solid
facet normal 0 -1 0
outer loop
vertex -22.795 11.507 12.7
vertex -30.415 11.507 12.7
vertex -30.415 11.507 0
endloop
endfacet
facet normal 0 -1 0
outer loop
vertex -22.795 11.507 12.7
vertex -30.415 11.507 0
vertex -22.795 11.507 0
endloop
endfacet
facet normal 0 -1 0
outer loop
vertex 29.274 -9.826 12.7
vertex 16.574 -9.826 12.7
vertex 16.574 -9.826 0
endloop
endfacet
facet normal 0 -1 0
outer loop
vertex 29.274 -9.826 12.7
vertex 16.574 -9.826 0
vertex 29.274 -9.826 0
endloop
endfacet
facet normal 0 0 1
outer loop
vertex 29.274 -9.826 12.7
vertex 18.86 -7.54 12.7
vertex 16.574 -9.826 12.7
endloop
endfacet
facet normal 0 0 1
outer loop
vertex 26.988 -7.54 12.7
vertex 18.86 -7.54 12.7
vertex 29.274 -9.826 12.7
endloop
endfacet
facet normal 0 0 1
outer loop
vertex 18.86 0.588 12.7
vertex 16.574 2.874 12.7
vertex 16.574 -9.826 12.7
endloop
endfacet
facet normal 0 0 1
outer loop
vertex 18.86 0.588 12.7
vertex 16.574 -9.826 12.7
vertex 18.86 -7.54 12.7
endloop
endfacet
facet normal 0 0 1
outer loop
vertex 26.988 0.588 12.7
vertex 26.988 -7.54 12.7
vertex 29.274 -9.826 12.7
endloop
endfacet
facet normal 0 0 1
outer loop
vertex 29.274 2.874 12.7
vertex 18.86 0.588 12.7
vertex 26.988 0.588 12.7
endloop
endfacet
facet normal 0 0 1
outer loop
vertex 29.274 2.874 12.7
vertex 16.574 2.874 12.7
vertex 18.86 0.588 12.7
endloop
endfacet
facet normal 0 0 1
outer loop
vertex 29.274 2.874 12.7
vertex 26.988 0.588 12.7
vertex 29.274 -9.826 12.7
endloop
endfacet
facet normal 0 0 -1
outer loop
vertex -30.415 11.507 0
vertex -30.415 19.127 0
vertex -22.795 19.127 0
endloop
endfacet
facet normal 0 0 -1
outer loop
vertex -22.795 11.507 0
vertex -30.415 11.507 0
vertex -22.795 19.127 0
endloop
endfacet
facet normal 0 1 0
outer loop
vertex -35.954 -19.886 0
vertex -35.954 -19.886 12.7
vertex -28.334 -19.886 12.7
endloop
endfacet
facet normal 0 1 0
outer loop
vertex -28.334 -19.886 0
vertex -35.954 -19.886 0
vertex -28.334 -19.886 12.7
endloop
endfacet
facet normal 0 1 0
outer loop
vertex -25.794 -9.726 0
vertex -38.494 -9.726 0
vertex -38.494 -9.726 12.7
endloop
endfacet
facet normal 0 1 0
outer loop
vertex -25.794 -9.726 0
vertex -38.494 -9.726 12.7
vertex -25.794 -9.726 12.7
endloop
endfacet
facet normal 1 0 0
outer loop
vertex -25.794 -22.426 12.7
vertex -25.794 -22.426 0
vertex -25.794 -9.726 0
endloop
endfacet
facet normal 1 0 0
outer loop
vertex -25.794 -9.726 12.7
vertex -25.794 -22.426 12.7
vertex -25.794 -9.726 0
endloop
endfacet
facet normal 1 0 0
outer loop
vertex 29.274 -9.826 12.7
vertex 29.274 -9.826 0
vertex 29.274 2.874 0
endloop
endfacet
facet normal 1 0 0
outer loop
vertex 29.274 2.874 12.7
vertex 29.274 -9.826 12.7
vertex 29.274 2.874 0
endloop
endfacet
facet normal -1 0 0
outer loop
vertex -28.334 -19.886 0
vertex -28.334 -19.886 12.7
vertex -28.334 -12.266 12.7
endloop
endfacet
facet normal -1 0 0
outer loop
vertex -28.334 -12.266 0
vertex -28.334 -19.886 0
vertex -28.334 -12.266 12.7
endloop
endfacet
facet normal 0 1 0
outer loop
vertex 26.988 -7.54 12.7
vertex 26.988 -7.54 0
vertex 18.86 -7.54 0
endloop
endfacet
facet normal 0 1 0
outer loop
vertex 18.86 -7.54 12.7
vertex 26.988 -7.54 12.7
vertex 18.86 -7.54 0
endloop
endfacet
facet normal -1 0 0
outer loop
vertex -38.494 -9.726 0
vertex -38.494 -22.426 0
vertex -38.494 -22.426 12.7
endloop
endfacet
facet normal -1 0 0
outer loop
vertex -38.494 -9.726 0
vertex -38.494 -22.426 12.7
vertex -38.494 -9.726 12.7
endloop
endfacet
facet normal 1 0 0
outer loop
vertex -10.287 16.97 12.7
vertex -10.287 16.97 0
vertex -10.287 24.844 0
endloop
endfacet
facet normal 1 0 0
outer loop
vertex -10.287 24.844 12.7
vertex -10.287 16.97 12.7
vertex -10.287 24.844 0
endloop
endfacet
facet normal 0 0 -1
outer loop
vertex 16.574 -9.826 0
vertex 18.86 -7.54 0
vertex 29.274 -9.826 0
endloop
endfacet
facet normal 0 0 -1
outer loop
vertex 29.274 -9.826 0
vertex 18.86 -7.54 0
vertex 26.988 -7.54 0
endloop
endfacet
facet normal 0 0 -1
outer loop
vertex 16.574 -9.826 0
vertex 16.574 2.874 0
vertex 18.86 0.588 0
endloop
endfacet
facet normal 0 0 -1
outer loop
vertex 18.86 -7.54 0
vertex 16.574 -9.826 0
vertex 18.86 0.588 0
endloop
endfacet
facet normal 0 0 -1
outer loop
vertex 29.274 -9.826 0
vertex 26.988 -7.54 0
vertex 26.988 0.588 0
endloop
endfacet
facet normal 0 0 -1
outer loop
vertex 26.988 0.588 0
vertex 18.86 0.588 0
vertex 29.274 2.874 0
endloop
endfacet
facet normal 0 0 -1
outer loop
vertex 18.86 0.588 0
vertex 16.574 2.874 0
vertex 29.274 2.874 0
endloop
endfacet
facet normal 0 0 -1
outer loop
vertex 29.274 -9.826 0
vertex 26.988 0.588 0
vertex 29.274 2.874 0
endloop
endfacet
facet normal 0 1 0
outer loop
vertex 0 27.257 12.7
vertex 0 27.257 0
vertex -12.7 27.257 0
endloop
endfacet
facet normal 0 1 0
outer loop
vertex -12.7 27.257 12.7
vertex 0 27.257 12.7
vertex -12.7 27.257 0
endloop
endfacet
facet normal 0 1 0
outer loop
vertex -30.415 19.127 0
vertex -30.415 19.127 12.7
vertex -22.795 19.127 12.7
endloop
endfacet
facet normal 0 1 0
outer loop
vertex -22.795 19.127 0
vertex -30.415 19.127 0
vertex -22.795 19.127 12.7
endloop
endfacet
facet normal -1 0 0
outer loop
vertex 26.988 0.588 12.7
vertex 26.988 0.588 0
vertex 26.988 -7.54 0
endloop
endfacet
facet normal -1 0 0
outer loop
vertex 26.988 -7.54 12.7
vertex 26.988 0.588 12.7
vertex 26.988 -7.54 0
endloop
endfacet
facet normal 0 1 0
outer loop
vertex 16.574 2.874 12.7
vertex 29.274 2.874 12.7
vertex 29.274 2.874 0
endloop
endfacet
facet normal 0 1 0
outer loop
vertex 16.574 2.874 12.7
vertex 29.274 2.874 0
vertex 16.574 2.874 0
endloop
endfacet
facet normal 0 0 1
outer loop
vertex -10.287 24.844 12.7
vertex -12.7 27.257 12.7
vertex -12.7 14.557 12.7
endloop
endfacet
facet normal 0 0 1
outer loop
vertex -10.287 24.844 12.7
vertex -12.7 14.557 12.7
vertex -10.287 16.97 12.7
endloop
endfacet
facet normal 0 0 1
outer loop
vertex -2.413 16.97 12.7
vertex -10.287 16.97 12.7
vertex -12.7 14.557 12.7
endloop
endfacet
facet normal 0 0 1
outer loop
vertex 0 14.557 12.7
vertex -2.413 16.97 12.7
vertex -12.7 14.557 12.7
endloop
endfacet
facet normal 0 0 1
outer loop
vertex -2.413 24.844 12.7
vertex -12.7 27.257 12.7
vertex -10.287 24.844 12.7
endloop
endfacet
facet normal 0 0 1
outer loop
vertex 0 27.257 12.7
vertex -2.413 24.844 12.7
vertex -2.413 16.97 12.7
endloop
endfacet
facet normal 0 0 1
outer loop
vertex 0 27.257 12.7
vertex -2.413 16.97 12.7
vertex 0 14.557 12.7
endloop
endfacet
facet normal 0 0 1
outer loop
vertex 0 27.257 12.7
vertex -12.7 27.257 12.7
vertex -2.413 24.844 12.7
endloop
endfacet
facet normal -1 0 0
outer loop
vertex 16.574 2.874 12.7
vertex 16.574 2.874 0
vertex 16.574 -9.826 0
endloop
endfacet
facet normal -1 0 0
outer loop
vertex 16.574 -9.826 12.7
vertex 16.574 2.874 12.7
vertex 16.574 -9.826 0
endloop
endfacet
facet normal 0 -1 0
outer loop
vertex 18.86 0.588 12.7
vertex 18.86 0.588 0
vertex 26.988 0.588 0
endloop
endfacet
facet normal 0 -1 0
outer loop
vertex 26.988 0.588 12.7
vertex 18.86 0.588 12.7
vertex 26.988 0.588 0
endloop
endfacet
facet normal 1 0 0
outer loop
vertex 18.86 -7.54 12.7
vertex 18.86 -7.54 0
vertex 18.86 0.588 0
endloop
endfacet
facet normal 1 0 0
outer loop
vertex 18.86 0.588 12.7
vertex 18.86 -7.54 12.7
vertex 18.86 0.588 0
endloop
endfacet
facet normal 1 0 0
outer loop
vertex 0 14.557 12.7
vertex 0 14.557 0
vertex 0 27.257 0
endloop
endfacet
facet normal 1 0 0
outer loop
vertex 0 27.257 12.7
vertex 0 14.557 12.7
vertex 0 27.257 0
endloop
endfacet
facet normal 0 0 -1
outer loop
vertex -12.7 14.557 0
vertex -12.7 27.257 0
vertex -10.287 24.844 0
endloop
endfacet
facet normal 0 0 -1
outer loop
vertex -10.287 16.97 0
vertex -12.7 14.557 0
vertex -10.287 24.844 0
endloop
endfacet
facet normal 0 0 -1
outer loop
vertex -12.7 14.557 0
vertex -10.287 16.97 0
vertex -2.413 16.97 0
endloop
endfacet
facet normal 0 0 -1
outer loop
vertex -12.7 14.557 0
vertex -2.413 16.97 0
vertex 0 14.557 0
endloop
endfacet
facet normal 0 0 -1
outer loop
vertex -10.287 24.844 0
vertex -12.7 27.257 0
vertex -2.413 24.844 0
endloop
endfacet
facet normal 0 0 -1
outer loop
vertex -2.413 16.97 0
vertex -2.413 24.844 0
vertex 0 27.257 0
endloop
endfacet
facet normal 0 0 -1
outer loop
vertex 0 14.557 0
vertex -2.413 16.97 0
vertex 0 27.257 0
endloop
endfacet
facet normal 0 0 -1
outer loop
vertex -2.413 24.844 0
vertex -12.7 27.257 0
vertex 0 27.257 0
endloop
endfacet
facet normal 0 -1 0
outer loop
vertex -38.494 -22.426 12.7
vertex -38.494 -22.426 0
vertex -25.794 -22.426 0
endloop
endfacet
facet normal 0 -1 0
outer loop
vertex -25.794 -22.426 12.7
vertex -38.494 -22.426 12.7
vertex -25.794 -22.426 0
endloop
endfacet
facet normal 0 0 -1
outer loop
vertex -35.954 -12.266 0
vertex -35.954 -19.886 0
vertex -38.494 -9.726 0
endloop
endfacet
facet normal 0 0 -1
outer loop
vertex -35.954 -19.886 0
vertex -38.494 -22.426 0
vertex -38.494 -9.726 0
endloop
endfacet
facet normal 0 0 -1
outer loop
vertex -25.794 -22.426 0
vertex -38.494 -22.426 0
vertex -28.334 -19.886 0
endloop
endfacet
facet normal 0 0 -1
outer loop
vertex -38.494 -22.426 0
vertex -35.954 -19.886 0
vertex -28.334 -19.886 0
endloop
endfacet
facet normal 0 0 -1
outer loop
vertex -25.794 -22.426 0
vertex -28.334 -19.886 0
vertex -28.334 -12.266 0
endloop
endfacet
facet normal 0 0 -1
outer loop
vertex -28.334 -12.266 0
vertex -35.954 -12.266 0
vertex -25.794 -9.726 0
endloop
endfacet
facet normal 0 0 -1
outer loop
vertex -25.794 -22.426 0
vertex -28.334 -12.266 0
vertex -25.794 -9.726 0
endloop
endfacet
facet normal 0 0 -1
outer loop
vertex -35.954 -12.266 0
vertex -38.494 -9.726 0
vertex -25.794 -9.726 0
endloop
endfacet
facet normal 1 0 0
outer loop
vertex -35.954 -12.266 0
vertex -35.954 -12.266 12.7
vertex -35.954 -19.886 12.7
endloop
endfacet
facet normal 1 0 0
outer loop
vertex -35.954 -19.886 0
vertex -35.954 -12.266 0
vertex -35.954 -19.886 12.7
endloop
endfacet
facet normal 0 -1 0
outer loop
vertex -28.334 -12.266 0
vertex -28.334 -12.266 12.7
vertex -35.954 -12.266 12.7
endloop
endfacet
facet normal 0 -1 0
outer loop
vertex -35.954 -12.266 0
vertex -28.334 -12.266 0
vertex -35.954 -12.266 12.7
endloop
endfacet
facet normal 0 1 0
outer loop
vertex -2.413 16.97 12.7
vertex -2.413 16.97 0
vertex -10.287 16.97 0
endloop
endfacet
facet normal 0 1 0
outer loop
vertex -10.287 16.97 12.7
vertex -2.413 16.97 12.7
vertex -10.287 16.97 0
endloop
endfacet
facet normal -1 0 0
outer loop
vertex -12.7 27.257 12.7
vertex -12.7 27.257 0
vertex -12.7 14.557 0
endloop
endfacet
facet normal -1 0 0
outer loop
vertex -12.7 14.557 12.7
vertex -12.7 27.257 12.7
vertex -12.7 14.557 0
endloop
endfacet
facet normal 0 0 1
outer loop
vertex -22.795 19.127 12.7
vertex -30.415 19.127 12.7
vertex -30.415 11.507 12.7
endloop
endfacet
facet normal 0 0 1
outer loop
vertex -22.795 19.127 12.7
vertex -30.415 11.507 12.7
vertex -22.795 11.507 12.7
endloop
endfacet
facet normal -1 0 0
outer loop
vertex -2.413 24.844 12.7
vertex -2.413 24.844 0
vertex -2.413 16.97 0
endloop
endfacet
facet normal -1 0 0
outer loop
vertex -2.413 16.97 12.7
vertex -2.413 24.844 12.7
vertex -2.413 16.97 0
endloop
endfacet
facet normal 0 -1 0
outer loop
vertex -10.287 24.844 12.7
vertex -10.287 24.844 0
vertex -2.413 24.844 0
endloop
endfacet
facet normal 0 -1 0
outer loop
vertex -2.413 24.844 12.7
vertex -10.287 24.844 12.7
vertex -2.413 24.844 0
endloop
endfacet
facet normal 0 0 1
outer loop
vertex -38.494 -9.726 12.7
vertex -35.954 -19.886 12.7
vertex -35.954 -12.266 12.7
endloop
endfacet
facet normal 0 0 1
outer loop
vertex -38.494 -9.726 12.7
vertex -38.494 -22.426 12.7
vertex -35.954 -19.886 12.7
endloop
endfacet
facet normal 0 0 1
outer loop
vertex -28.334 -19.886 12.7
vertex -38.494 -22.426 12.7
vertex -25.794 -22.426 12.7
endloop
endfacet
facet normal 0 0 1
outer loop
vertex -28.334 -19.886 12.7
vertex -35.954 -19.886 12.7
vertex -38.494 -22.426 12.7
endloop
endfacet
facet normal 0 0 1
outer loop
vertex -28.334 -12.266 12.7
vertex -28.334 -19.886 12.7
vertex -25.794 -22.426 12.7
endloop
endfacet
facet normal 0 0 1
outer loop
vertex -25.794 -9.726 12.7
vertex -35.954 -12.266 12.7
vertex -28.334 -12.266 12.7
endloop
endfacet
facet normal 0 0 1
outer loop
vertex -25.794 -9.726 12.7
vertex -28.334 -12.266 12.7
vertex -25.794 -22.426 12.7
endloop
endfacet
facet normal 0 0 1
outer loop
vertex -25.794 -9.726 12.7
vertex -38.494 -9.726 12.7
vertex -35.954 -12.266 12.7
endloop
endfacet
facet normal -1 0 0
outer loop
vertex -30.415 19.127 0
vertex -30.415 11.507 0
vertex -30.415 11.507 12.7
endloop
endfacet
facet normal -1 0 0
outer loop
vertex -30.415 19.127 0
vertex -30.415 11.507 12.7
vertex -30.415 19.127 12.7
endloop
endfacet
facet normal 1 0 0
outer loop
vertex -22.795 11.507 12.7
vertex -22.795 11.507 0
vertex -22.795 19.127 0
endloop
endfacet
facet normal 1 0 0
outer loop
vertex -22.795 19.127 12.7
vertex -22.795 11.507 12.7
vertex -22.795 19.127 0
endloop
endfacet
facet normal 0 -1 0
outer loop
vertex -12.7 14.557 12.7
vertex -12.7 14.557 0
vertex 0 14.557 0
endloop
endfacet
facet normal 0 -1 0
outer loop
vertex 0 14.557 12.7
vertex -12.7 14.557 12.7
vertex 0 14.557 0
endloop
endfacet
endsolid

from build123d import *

# Parameters (mm, degrees)
F0_W      = 12.7
F0_H      = 12.7
F1_DEPTH  = 12.7
F3_DEPTH  = 25.4
F5_DEPTH  = 12.7
F6_DEPTH  = 12.7
F7_W      = 7.62
F7_H      = 7.62
F8_DEPTH  = 12.7
F10_DEPTH = 12.7


with BuildPart() as f1:
    # F0 (on Top) → F1 (new body)
    with BuildSketch(Plane.XY):
        with Locations((-32.144345, -16.076457)):
            Rectangle(F0_W, F0_H)
    extrude(amount=F1_DEPTH)

    # F2 (on face) → F3 (cut)
    with BuildSketch(Plane.XY.offset(12.7)):
        Polygon((-28.334345, -19.886457), (-28.334345, -16.076457), (-28.334345, -12.266457), (-32.144345, -12.266457), (-35.954345, -12.266457), (-35.954345, -16.076457), (-35.954345, -19.886457), (-32.144345, -19.886457), align=None)
    extrude(amount=-F3_DEPTH, mode=Mode.SUBTRACT)


with BuildPart() as f5:
    # F4 (on Top) → F5 (new body)
    with BuildSketch(Plane.XY):
        Polygon((16.574092, 0.588263), (16.574092, -9.825737), (22.924092, -9.825737), (22.924092, -7.539737), (18.860092, -7.539737), (18.860092, -3.475737), (18.860092, 0.588263), align=None)
        Polygon((22.924092, -7.539737), (22.924092, -9.825737), (29.274092, -9.825737), (29.274092, -3.475737), (26.988092, -3.475737), (26.988092, -7.539737), align=None)
        Polygon((16.574092, 2.874263), (16.574092, 0.588263), (18.860092, 0.588263), (21.67373, 0.588263), (21.67373, 2.874263), align=None)
        Polygon((26.988092, -3.475737), (29.274092, -3.475737), (29.274092, 2.874263), (21.67373, 2.874263), (21.67373, 0.588263), (26.988092, 0.588263), align=None)
    extrude(amount=F5_DEPTH)

    # F4 (on Top) → F6 (join)
    with BuildSketch(Plane.XY):
        Polygon((16.574092, 0.588263), (16.574092, -9.825737), (22.924092, -9.825737), (22.924092, -7.539737), (18.860092, -7.539737), (18.860092, -3.475737), (18.860092, 0.588263), align=None)
        Polygon((22.924092, -7.539737), (22.924092, -9.825737), (29.274092, -9.825737), (29.274092, -3.475737), (26.988092, -3.475737), (26.988092, -7.539737), align=None)
        Polygon((16.574092, 2.874263), (16.574092, 0.588263), (18.860092, 0.588263), (21.67373, 0.588263), (21.67373, 2.874263), align=None)
        Polygon((26.988092, -3.475737), (29.274092, -3.475737), (29.274092, 2.874263), (21.67373, 2.874263), (21.67373, 0.588263), (26.988092, 0.588263), align=None)
    extrude(amount=F6_DEPTH)


with BuildPart() as f8:
    # F7 (on Top) → F8 (new body)
    with BuildSketch(Plane.XY):
        with Locations((-26.604773, 15.316614)):
            Rectangle(F7_W, F7_H)
    extrude(amount=F8_DEPTH)


with BuildPart() as f10:
    # F9 (on Top) → F10 (new body)
    with BuildSketch(Plane.XY):
        Polygon((-6.35, 27.256869), (-12.7, 27.256869), (-12.7, 23.148131), (-10.287, 23.148131), (-10.287, 24.843869), (-6.35, 24.843869), align=None)
        Polygon((0, 27.256869), (-6.35, 27.256869), (-6.35, 24.843869), (-2.413, 24.843869), (-2.413, 21.997252), (0, 21.997252), align=None)
        Polygon((0, 14.556869), (0, 21.997252), (-2.413, 21.997252), (-2.413, 16.969869), (-7.789327, 16.969869), (-7.789327, 14.556869), align=None)
        Polygon((-10.287, 23.148131), (-12.7, 23.148131), (-12.7, 14.556869), (-7.789327, 14.556869), (-7.789327, 16.969869), (-10.287, 16.969869), align=None)
    extrude(amount=F10_DEPTH)


solid = Compound([f1.part, f5.part, f8.part, f10.part])
